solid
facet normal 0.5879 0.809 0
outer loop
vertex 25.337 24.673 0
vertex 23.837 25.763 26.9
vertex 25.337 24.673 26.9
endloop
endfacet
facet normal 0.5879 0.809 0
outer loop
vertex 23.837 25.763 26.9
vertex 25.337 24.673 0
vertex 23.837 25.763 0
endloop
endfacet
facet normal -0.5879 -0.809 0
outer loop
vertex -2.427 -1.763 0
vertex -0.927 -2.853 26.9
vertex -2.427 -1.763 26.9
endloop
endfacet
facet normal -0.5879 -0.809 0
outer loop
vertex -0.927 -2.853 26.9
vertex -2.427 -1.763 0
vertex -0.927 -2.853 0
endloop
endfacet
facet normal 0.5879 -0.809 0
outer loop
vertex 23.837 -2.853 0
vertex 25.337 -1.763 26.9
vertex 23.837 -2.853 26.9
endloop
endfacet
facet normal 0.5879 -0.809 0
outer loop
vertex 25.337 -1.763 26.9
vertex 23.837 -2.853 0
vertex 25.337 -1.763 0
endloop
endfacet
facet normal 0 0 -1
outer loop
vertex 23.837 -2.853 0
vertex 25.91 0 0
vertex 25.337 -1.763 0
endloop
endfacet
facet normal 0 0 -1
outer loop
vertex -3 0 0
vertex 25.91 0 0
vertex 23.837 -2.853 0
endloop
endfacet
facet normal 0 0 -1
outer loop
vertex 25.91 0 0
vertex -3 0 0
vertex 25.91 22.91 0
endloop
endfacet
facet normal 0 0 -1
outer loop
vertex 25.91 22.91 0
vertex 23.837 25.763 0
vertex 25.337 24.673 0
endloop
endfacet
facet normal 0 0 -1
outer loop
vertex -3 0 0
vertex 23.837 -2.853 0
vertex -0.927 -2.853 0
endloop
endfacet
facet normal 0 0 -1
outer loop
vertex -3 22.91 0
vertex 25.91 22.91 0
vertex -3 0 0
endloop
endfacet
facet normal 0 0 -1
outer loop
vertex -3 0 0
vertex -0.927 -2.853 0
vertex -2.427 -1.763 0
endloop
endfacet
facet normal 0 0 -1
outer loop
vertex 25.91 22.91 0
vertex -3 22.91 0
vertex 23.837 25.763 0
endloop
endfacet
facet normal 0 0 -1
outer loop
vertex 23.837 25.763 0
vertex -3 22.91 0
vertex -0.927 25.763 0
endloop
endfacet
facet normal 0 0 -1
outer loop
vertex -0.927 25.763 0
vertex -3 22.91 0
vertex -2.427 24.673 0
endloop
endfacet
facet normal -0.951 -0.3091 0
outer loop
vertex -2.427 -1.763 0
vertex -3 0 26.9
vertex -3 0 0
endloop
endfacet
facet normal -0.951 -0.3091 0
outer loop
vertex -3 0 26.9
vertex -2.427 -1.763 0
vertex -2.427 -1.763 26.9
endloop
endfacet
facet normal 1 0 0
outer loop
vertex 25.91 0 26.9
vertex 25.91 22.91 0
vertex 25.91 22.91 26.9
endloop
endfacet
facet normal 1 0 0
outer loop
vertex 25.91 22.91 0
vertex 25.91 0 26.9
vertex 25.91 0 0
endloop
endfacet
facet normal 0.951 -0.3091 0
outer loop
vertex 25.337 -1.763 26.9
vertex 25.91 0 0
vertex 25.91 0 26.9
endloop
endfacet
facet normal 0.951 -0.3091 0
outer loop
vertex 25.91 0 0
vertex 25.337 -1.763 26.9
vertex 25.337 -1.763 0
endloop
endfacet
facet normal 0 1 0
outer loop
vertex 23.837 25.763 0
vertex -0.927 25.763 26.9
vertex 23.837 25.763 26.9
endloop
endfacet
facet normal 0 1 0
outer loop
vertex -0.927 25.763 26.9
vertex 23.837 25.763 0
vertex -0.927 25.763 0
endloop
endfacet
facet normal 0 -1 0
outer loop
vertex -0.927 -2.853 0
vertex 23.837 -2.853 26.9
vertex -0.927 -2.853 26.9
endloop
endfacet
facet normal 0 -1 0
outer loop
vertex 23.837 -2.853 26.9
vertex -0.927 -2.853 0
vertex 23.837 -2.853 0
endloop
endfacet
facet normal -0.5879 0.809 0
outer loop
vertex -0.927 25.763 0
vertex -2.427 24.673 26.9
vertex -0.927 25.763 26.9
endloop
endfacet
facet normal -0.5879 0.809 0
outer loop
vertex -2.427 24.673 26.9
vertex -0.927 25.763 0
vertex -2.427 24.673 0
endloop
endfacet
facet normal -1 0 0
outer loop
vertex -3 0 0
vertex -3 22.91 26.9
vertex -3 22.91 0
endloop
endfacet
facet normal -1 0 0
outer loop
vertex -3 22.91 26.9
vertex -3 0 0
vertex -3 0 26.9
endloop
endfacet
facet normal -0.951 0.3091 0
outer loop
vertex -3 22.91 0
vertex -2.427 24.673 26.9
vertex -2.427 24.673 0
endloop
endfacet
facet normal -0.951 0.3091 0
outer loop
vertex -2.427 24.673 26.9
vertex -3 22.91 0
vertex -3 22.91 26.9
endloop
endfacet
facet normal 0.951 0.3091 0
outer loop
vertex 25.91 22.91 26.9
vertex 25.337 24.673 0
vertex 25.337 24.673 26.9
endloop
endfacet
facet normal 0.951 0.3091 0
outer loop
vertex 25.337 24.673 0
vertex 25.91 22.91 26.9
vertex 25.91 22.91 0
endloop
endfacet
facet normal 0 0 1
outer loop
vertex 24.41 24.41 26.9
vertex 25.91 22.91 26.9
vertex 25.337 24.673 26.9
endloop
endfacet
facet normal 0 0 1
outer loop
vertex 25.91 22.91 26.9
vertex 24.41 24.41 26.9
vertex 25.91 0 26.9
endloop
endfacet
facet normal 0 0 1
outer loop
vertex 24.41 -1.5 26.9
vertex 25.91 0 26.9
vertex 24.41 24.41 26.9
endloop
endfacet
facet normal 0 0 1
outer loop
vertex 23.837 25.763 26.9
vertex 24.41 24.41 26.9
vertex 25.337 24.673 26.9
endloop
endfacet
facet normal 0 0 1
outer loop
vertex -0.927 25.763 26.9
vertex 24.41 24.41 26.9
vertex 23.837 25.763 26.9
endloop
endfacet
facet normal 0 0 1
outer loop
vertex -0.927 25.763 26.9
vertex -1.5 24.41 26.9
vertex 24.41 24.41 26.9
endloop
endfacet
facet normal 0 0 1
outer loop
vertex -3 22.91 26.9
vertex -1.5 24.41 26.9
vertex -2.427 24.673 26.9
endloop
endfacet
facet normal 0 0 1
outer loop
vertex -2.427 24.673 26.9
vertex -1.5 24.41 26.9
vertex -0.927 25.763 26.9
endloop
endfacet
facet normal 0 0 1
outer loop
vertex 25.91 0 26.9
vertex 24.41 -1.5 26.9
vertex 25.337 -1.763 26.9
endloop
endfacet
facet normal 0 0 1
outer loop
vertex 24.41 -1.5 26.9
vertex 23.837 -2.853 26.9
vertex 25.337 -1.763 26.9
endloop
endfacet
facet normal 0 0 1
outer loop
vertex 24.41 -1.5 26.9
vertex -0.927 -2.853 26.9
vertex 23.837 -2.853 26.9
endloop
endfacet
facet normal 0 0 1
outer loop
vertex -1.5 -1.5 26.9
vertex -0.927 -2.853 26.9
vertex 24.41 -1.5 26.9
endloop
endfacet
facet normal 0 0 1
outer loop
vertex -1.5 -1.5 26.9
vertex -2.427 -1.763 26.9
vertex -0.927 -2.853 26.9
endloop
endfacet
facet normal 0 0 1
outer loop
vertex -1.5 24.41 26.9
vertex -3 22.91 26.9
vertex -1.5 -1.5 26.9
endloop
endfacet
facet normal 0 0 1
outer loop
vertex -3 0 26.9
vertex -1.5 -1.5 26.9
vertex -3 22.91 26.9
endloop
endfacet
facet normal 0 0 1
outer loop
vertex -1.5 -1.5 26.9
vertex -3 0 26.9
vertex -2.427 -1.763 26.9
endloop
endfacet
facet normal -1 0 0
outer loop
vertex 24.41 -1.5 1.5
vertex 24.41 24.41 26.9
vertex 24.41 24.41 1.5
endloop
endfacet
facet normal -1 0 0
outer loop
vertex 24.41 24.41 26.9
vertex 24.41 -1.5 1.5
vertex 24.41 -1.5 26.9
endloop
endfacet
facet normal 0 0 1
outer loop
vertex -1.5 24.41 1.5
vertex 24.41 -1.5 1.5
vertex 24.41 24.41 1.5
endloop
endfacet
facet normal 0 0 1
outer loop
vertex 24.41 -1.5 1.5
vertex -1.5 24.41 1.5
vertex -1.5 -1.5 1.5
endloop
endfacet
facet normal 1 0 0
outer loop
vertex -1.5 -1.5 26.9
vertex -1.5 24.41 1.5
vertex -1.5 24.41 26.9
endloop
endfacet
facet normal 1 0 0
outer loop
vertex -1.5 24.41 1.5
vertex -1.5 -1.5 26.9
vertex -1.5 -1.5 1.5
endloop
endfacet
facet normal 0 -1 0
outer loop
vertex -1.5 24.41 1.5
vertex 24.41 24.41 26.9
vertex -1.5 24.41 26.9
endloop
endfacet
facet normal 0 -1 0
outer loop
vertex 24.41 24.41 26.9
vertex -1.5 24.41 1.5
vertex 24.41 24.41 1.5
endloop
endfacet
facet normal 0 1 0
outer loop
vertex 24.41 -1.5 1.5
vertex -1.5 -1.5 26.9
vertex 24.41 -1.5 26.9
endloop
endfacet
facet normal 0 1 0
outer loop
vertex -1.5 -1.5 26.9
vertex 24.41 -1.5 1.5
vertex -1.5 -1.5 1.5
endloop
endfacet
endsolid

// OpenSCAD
difference() {
	minkowski() {
		cylinder(h = 1e-05, r = 3);
		cube(size = [22.91, 22.91, 26.9]);
	}
	translate(v = [-1.5, -1.5, 1.5]) {
		cube(size = [25.91, 25.91, 28.4]);
	}
}
